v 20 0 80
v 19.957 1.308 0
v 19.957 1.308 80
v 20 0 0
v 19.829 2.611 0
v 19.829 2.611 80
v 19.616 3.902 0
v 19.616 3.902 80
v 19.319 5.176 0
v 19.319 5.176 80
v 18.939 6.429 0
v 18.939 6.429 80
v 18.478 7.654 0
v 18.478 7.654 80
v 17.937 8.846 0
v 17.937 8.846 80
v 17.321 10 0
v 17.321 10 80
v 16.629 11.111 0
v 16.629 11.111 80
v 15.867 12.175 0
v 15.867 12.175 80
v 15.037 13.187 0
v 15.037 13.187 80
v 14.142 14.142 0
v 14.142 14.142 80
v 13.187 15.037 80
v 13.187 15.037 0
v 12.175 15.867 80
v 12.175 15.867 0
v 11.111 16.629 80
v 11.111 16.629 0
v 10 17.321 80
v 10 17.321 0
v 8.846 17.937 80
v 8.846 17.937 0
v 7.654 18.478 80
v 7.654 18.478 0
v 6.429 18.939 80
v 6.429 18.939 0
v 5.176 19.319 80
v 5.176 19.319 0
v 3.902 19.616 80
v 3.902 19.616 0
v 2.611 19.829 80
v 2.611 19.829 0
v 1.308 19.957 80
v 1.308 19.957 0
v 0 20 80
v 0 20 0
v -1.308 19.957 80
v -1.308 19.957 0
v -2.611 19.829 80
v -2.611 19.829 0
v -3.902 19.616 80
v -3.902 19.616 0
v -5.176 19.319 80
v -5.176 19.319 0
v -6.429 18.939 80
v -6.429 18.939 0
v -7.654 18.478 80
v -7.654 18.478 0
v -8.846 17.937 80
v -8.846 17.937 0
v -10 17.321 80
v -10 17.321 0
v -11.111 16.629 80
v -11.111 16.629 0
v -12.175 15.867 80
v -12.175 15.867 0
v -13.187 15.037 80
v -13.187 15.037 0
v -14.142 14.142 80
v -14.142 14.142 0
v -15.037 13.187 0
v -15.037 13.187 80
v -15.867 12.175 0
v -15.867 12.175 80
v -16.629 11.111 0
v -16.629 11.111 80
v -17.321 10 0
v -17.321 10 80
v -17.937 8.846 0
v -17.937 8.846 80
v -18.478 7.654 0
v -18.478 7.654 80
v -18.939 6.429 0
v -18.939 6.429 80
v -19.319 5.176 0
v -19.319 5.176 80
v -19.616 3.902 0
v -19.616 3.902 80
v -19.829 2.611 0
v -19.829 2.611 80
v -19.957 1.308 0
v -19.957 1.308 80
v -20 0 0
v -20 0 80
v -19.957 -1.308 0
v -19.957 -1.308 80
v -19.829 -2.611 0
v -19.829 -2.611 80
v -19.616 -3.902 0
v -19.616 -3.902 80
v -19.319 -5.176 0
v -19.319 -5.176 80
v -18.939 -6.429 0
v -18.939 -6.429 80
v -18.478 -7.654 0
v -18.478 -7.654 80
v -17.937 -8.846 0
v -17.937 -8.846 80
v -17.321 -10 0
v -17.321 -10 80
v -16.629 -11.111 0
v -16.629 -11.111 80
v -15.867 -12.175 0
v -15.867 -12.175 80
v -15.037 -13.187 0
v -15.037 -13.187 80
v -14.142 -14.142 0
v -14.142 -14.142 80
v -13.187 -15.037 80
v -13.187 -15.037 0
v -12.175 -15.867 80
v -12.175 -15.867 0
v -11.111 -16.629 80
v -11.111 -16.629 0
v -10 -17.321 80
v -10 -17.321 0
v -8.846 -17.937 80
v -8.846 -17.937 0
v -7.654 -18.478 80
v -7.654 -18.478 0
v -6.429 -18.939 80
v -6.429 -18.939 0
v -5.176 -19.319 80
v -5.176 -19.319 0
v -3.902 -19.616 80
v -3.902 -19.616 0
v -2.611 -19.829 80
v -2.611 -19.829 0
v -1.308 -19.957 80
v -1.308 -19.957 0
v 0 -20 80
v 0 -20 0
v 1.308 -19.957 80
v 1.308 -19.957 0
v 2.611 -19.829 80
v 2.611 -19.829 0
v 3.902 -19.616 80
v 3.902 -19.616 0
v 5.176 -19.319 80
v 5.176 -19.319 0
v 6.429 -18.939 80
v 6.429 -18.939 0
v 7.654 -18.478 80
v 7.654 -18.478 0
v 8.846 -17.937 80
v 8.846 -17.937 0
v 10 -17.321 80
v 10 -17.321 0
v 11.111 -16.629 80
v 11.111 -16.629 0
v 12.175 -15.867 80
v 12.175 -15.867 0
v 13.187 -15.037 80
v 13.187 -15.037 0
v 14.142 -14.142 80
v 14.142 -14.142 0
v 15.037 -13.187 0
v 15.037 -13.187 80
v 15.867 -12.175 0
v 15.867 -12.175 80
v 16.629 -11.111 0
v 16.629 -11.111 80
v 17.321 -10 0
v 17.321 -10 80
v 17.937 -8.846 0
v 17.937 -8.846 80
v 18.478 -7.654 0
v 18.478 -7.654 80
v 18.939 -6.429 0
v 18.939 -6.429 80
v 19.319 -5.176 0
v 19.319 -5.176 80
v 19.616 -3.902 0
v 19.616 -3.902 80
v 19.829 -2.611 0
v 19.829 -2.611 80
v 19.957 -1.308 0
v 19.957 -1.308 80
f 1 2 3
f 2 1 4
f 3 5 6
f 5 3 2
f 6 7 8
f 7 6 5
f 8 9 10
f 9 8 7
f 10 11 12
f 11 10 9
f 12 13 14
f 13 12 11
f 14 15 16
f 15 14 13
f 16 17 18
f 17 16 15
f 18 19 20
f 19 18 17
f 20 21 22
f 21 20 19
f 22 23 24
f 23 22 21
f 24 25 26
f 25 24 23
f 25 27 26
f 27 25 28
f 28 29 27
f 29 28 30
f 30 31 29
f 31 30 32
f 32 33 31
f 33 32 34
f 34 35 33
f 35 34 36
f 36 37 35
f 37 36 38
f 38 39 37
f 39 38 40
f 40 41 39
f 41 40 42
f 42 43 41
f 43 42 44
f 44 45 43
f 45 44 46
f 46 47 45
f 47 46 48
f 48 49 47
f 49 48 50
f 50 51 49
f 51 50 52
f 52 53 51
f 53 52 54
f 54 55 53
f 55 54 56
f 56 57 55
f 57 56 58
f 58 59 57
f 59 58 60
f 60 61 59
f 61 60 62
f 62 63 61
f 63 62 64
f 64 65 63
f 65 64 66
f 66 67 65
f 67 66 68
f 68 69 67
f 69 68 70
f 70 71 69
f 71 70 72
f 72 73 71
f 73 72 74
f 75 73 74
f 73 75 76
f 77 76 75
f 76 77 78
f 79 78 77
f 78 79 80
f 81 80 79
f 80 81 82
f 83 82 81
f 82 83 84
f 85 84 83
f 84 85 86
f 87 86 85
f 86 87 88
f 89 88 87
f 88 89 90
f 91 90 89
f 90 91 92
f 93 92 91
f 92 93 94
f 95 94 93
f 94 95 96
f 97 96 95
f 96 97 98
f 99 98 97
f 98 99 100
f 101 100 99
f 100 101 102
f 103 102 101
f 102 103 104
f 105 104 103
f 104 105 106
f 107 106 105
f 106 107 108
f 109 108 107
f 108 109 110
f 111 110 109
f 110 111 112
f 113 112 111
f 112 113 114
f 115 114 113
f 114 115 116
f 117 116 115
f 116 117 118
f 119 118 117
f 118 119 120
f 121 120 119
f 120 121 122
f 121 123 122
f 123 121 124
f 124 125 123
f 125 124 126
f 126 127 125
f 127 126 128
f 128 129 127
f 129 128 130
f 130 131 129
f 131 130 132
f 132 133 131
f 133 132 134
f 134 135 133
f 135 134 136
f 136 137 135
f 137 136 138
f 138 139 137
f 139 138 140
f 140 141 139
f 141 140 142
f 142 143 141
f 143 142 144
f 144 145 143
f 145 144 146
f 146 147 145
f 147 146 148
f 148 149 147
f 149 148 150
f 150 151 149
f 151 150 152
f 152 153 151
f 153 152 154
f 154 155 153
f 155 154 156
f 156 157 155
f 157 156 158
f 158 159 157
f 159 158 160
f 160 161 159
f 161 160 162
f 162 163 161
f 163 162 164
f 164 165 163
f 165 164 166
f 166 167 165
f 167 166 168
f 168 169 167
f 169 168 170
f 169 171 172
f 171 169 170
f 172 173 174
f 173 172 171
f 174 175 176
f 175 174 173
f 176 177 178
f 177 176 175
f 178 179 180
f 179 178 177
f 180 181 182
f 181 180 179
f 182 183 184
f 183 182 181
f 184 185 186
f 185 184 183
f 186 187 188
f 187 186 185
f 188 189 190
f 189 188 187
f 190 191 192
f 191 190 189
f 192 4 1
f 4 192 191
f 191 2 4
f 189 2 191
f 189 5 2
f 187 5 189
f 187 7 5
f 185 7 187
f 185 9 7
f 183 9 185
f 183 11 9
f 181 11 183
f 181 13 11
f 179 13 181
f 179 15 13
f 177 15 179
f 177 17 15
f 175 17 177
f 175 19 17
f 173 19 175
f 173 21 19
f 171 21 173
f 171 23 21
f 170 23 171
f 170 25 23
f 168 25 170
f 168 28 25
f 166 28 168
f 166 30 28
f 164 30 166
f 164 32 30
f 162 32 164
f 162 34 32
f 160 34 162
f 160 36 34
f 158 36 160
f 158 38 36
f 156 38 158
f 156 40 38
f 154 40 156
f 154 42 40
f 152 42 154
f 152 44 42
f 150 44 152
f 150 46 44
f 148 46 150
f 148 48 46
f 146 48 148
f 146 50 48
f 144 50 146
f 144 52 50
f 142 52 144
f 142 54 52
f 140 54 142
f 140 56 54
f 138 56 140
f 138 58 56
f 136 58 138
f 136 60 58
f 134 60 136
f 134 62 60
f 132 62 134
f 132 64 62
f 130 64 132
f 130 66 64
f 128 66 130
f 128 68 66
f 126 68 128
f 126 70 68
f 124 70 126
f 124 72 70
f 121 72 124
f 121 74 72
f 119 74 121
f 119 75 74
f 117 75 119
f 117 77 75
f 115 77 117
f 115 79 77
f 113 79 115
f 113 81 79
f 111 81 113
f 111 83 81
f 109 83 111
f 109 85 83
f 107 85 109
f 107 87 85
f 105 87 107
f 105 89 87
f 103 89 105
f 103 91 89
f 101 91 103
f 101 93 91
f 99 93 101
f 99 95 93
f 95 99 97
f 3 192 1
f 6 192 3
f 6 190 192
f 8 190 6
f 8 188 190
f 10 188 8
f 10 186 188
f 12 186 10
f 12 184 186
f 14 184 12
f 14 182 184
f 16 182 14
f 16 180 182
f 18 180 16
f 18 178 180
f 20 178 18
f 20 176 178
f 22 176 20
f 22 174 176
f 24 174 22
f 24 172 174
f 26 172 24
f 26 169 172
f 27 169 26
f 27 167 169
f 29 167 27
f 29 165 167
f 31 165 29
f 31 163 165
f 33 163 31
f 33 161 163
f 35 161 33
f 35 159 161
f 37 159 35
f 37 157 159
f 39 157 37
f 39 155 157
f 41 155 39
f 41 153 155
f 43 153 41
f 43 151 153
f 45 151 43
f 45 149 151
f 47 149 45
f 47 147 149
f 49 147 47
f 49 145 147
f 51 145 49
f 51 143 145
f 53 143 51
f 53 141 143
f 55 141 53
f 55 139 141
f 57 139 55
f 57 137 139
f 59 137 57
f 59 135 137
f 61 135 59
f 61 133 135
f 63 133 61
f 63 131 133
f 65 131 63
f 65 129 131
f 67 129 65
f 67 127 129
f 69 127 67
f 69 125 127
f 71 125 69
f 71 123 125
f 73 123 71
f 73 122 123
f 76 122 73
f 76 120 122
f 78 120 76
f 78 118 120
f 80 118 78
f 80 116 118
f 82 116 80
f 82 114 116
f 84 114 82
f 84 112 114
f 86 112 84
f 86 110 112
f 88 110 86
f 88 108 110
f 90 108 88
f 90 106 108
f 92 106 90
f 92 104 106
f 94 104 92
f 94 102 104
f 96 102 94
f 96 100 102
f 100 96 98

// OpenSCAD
radius = 20.0;
length = 80.0;
cylinder(r=radius, h=length, $fn=96);
